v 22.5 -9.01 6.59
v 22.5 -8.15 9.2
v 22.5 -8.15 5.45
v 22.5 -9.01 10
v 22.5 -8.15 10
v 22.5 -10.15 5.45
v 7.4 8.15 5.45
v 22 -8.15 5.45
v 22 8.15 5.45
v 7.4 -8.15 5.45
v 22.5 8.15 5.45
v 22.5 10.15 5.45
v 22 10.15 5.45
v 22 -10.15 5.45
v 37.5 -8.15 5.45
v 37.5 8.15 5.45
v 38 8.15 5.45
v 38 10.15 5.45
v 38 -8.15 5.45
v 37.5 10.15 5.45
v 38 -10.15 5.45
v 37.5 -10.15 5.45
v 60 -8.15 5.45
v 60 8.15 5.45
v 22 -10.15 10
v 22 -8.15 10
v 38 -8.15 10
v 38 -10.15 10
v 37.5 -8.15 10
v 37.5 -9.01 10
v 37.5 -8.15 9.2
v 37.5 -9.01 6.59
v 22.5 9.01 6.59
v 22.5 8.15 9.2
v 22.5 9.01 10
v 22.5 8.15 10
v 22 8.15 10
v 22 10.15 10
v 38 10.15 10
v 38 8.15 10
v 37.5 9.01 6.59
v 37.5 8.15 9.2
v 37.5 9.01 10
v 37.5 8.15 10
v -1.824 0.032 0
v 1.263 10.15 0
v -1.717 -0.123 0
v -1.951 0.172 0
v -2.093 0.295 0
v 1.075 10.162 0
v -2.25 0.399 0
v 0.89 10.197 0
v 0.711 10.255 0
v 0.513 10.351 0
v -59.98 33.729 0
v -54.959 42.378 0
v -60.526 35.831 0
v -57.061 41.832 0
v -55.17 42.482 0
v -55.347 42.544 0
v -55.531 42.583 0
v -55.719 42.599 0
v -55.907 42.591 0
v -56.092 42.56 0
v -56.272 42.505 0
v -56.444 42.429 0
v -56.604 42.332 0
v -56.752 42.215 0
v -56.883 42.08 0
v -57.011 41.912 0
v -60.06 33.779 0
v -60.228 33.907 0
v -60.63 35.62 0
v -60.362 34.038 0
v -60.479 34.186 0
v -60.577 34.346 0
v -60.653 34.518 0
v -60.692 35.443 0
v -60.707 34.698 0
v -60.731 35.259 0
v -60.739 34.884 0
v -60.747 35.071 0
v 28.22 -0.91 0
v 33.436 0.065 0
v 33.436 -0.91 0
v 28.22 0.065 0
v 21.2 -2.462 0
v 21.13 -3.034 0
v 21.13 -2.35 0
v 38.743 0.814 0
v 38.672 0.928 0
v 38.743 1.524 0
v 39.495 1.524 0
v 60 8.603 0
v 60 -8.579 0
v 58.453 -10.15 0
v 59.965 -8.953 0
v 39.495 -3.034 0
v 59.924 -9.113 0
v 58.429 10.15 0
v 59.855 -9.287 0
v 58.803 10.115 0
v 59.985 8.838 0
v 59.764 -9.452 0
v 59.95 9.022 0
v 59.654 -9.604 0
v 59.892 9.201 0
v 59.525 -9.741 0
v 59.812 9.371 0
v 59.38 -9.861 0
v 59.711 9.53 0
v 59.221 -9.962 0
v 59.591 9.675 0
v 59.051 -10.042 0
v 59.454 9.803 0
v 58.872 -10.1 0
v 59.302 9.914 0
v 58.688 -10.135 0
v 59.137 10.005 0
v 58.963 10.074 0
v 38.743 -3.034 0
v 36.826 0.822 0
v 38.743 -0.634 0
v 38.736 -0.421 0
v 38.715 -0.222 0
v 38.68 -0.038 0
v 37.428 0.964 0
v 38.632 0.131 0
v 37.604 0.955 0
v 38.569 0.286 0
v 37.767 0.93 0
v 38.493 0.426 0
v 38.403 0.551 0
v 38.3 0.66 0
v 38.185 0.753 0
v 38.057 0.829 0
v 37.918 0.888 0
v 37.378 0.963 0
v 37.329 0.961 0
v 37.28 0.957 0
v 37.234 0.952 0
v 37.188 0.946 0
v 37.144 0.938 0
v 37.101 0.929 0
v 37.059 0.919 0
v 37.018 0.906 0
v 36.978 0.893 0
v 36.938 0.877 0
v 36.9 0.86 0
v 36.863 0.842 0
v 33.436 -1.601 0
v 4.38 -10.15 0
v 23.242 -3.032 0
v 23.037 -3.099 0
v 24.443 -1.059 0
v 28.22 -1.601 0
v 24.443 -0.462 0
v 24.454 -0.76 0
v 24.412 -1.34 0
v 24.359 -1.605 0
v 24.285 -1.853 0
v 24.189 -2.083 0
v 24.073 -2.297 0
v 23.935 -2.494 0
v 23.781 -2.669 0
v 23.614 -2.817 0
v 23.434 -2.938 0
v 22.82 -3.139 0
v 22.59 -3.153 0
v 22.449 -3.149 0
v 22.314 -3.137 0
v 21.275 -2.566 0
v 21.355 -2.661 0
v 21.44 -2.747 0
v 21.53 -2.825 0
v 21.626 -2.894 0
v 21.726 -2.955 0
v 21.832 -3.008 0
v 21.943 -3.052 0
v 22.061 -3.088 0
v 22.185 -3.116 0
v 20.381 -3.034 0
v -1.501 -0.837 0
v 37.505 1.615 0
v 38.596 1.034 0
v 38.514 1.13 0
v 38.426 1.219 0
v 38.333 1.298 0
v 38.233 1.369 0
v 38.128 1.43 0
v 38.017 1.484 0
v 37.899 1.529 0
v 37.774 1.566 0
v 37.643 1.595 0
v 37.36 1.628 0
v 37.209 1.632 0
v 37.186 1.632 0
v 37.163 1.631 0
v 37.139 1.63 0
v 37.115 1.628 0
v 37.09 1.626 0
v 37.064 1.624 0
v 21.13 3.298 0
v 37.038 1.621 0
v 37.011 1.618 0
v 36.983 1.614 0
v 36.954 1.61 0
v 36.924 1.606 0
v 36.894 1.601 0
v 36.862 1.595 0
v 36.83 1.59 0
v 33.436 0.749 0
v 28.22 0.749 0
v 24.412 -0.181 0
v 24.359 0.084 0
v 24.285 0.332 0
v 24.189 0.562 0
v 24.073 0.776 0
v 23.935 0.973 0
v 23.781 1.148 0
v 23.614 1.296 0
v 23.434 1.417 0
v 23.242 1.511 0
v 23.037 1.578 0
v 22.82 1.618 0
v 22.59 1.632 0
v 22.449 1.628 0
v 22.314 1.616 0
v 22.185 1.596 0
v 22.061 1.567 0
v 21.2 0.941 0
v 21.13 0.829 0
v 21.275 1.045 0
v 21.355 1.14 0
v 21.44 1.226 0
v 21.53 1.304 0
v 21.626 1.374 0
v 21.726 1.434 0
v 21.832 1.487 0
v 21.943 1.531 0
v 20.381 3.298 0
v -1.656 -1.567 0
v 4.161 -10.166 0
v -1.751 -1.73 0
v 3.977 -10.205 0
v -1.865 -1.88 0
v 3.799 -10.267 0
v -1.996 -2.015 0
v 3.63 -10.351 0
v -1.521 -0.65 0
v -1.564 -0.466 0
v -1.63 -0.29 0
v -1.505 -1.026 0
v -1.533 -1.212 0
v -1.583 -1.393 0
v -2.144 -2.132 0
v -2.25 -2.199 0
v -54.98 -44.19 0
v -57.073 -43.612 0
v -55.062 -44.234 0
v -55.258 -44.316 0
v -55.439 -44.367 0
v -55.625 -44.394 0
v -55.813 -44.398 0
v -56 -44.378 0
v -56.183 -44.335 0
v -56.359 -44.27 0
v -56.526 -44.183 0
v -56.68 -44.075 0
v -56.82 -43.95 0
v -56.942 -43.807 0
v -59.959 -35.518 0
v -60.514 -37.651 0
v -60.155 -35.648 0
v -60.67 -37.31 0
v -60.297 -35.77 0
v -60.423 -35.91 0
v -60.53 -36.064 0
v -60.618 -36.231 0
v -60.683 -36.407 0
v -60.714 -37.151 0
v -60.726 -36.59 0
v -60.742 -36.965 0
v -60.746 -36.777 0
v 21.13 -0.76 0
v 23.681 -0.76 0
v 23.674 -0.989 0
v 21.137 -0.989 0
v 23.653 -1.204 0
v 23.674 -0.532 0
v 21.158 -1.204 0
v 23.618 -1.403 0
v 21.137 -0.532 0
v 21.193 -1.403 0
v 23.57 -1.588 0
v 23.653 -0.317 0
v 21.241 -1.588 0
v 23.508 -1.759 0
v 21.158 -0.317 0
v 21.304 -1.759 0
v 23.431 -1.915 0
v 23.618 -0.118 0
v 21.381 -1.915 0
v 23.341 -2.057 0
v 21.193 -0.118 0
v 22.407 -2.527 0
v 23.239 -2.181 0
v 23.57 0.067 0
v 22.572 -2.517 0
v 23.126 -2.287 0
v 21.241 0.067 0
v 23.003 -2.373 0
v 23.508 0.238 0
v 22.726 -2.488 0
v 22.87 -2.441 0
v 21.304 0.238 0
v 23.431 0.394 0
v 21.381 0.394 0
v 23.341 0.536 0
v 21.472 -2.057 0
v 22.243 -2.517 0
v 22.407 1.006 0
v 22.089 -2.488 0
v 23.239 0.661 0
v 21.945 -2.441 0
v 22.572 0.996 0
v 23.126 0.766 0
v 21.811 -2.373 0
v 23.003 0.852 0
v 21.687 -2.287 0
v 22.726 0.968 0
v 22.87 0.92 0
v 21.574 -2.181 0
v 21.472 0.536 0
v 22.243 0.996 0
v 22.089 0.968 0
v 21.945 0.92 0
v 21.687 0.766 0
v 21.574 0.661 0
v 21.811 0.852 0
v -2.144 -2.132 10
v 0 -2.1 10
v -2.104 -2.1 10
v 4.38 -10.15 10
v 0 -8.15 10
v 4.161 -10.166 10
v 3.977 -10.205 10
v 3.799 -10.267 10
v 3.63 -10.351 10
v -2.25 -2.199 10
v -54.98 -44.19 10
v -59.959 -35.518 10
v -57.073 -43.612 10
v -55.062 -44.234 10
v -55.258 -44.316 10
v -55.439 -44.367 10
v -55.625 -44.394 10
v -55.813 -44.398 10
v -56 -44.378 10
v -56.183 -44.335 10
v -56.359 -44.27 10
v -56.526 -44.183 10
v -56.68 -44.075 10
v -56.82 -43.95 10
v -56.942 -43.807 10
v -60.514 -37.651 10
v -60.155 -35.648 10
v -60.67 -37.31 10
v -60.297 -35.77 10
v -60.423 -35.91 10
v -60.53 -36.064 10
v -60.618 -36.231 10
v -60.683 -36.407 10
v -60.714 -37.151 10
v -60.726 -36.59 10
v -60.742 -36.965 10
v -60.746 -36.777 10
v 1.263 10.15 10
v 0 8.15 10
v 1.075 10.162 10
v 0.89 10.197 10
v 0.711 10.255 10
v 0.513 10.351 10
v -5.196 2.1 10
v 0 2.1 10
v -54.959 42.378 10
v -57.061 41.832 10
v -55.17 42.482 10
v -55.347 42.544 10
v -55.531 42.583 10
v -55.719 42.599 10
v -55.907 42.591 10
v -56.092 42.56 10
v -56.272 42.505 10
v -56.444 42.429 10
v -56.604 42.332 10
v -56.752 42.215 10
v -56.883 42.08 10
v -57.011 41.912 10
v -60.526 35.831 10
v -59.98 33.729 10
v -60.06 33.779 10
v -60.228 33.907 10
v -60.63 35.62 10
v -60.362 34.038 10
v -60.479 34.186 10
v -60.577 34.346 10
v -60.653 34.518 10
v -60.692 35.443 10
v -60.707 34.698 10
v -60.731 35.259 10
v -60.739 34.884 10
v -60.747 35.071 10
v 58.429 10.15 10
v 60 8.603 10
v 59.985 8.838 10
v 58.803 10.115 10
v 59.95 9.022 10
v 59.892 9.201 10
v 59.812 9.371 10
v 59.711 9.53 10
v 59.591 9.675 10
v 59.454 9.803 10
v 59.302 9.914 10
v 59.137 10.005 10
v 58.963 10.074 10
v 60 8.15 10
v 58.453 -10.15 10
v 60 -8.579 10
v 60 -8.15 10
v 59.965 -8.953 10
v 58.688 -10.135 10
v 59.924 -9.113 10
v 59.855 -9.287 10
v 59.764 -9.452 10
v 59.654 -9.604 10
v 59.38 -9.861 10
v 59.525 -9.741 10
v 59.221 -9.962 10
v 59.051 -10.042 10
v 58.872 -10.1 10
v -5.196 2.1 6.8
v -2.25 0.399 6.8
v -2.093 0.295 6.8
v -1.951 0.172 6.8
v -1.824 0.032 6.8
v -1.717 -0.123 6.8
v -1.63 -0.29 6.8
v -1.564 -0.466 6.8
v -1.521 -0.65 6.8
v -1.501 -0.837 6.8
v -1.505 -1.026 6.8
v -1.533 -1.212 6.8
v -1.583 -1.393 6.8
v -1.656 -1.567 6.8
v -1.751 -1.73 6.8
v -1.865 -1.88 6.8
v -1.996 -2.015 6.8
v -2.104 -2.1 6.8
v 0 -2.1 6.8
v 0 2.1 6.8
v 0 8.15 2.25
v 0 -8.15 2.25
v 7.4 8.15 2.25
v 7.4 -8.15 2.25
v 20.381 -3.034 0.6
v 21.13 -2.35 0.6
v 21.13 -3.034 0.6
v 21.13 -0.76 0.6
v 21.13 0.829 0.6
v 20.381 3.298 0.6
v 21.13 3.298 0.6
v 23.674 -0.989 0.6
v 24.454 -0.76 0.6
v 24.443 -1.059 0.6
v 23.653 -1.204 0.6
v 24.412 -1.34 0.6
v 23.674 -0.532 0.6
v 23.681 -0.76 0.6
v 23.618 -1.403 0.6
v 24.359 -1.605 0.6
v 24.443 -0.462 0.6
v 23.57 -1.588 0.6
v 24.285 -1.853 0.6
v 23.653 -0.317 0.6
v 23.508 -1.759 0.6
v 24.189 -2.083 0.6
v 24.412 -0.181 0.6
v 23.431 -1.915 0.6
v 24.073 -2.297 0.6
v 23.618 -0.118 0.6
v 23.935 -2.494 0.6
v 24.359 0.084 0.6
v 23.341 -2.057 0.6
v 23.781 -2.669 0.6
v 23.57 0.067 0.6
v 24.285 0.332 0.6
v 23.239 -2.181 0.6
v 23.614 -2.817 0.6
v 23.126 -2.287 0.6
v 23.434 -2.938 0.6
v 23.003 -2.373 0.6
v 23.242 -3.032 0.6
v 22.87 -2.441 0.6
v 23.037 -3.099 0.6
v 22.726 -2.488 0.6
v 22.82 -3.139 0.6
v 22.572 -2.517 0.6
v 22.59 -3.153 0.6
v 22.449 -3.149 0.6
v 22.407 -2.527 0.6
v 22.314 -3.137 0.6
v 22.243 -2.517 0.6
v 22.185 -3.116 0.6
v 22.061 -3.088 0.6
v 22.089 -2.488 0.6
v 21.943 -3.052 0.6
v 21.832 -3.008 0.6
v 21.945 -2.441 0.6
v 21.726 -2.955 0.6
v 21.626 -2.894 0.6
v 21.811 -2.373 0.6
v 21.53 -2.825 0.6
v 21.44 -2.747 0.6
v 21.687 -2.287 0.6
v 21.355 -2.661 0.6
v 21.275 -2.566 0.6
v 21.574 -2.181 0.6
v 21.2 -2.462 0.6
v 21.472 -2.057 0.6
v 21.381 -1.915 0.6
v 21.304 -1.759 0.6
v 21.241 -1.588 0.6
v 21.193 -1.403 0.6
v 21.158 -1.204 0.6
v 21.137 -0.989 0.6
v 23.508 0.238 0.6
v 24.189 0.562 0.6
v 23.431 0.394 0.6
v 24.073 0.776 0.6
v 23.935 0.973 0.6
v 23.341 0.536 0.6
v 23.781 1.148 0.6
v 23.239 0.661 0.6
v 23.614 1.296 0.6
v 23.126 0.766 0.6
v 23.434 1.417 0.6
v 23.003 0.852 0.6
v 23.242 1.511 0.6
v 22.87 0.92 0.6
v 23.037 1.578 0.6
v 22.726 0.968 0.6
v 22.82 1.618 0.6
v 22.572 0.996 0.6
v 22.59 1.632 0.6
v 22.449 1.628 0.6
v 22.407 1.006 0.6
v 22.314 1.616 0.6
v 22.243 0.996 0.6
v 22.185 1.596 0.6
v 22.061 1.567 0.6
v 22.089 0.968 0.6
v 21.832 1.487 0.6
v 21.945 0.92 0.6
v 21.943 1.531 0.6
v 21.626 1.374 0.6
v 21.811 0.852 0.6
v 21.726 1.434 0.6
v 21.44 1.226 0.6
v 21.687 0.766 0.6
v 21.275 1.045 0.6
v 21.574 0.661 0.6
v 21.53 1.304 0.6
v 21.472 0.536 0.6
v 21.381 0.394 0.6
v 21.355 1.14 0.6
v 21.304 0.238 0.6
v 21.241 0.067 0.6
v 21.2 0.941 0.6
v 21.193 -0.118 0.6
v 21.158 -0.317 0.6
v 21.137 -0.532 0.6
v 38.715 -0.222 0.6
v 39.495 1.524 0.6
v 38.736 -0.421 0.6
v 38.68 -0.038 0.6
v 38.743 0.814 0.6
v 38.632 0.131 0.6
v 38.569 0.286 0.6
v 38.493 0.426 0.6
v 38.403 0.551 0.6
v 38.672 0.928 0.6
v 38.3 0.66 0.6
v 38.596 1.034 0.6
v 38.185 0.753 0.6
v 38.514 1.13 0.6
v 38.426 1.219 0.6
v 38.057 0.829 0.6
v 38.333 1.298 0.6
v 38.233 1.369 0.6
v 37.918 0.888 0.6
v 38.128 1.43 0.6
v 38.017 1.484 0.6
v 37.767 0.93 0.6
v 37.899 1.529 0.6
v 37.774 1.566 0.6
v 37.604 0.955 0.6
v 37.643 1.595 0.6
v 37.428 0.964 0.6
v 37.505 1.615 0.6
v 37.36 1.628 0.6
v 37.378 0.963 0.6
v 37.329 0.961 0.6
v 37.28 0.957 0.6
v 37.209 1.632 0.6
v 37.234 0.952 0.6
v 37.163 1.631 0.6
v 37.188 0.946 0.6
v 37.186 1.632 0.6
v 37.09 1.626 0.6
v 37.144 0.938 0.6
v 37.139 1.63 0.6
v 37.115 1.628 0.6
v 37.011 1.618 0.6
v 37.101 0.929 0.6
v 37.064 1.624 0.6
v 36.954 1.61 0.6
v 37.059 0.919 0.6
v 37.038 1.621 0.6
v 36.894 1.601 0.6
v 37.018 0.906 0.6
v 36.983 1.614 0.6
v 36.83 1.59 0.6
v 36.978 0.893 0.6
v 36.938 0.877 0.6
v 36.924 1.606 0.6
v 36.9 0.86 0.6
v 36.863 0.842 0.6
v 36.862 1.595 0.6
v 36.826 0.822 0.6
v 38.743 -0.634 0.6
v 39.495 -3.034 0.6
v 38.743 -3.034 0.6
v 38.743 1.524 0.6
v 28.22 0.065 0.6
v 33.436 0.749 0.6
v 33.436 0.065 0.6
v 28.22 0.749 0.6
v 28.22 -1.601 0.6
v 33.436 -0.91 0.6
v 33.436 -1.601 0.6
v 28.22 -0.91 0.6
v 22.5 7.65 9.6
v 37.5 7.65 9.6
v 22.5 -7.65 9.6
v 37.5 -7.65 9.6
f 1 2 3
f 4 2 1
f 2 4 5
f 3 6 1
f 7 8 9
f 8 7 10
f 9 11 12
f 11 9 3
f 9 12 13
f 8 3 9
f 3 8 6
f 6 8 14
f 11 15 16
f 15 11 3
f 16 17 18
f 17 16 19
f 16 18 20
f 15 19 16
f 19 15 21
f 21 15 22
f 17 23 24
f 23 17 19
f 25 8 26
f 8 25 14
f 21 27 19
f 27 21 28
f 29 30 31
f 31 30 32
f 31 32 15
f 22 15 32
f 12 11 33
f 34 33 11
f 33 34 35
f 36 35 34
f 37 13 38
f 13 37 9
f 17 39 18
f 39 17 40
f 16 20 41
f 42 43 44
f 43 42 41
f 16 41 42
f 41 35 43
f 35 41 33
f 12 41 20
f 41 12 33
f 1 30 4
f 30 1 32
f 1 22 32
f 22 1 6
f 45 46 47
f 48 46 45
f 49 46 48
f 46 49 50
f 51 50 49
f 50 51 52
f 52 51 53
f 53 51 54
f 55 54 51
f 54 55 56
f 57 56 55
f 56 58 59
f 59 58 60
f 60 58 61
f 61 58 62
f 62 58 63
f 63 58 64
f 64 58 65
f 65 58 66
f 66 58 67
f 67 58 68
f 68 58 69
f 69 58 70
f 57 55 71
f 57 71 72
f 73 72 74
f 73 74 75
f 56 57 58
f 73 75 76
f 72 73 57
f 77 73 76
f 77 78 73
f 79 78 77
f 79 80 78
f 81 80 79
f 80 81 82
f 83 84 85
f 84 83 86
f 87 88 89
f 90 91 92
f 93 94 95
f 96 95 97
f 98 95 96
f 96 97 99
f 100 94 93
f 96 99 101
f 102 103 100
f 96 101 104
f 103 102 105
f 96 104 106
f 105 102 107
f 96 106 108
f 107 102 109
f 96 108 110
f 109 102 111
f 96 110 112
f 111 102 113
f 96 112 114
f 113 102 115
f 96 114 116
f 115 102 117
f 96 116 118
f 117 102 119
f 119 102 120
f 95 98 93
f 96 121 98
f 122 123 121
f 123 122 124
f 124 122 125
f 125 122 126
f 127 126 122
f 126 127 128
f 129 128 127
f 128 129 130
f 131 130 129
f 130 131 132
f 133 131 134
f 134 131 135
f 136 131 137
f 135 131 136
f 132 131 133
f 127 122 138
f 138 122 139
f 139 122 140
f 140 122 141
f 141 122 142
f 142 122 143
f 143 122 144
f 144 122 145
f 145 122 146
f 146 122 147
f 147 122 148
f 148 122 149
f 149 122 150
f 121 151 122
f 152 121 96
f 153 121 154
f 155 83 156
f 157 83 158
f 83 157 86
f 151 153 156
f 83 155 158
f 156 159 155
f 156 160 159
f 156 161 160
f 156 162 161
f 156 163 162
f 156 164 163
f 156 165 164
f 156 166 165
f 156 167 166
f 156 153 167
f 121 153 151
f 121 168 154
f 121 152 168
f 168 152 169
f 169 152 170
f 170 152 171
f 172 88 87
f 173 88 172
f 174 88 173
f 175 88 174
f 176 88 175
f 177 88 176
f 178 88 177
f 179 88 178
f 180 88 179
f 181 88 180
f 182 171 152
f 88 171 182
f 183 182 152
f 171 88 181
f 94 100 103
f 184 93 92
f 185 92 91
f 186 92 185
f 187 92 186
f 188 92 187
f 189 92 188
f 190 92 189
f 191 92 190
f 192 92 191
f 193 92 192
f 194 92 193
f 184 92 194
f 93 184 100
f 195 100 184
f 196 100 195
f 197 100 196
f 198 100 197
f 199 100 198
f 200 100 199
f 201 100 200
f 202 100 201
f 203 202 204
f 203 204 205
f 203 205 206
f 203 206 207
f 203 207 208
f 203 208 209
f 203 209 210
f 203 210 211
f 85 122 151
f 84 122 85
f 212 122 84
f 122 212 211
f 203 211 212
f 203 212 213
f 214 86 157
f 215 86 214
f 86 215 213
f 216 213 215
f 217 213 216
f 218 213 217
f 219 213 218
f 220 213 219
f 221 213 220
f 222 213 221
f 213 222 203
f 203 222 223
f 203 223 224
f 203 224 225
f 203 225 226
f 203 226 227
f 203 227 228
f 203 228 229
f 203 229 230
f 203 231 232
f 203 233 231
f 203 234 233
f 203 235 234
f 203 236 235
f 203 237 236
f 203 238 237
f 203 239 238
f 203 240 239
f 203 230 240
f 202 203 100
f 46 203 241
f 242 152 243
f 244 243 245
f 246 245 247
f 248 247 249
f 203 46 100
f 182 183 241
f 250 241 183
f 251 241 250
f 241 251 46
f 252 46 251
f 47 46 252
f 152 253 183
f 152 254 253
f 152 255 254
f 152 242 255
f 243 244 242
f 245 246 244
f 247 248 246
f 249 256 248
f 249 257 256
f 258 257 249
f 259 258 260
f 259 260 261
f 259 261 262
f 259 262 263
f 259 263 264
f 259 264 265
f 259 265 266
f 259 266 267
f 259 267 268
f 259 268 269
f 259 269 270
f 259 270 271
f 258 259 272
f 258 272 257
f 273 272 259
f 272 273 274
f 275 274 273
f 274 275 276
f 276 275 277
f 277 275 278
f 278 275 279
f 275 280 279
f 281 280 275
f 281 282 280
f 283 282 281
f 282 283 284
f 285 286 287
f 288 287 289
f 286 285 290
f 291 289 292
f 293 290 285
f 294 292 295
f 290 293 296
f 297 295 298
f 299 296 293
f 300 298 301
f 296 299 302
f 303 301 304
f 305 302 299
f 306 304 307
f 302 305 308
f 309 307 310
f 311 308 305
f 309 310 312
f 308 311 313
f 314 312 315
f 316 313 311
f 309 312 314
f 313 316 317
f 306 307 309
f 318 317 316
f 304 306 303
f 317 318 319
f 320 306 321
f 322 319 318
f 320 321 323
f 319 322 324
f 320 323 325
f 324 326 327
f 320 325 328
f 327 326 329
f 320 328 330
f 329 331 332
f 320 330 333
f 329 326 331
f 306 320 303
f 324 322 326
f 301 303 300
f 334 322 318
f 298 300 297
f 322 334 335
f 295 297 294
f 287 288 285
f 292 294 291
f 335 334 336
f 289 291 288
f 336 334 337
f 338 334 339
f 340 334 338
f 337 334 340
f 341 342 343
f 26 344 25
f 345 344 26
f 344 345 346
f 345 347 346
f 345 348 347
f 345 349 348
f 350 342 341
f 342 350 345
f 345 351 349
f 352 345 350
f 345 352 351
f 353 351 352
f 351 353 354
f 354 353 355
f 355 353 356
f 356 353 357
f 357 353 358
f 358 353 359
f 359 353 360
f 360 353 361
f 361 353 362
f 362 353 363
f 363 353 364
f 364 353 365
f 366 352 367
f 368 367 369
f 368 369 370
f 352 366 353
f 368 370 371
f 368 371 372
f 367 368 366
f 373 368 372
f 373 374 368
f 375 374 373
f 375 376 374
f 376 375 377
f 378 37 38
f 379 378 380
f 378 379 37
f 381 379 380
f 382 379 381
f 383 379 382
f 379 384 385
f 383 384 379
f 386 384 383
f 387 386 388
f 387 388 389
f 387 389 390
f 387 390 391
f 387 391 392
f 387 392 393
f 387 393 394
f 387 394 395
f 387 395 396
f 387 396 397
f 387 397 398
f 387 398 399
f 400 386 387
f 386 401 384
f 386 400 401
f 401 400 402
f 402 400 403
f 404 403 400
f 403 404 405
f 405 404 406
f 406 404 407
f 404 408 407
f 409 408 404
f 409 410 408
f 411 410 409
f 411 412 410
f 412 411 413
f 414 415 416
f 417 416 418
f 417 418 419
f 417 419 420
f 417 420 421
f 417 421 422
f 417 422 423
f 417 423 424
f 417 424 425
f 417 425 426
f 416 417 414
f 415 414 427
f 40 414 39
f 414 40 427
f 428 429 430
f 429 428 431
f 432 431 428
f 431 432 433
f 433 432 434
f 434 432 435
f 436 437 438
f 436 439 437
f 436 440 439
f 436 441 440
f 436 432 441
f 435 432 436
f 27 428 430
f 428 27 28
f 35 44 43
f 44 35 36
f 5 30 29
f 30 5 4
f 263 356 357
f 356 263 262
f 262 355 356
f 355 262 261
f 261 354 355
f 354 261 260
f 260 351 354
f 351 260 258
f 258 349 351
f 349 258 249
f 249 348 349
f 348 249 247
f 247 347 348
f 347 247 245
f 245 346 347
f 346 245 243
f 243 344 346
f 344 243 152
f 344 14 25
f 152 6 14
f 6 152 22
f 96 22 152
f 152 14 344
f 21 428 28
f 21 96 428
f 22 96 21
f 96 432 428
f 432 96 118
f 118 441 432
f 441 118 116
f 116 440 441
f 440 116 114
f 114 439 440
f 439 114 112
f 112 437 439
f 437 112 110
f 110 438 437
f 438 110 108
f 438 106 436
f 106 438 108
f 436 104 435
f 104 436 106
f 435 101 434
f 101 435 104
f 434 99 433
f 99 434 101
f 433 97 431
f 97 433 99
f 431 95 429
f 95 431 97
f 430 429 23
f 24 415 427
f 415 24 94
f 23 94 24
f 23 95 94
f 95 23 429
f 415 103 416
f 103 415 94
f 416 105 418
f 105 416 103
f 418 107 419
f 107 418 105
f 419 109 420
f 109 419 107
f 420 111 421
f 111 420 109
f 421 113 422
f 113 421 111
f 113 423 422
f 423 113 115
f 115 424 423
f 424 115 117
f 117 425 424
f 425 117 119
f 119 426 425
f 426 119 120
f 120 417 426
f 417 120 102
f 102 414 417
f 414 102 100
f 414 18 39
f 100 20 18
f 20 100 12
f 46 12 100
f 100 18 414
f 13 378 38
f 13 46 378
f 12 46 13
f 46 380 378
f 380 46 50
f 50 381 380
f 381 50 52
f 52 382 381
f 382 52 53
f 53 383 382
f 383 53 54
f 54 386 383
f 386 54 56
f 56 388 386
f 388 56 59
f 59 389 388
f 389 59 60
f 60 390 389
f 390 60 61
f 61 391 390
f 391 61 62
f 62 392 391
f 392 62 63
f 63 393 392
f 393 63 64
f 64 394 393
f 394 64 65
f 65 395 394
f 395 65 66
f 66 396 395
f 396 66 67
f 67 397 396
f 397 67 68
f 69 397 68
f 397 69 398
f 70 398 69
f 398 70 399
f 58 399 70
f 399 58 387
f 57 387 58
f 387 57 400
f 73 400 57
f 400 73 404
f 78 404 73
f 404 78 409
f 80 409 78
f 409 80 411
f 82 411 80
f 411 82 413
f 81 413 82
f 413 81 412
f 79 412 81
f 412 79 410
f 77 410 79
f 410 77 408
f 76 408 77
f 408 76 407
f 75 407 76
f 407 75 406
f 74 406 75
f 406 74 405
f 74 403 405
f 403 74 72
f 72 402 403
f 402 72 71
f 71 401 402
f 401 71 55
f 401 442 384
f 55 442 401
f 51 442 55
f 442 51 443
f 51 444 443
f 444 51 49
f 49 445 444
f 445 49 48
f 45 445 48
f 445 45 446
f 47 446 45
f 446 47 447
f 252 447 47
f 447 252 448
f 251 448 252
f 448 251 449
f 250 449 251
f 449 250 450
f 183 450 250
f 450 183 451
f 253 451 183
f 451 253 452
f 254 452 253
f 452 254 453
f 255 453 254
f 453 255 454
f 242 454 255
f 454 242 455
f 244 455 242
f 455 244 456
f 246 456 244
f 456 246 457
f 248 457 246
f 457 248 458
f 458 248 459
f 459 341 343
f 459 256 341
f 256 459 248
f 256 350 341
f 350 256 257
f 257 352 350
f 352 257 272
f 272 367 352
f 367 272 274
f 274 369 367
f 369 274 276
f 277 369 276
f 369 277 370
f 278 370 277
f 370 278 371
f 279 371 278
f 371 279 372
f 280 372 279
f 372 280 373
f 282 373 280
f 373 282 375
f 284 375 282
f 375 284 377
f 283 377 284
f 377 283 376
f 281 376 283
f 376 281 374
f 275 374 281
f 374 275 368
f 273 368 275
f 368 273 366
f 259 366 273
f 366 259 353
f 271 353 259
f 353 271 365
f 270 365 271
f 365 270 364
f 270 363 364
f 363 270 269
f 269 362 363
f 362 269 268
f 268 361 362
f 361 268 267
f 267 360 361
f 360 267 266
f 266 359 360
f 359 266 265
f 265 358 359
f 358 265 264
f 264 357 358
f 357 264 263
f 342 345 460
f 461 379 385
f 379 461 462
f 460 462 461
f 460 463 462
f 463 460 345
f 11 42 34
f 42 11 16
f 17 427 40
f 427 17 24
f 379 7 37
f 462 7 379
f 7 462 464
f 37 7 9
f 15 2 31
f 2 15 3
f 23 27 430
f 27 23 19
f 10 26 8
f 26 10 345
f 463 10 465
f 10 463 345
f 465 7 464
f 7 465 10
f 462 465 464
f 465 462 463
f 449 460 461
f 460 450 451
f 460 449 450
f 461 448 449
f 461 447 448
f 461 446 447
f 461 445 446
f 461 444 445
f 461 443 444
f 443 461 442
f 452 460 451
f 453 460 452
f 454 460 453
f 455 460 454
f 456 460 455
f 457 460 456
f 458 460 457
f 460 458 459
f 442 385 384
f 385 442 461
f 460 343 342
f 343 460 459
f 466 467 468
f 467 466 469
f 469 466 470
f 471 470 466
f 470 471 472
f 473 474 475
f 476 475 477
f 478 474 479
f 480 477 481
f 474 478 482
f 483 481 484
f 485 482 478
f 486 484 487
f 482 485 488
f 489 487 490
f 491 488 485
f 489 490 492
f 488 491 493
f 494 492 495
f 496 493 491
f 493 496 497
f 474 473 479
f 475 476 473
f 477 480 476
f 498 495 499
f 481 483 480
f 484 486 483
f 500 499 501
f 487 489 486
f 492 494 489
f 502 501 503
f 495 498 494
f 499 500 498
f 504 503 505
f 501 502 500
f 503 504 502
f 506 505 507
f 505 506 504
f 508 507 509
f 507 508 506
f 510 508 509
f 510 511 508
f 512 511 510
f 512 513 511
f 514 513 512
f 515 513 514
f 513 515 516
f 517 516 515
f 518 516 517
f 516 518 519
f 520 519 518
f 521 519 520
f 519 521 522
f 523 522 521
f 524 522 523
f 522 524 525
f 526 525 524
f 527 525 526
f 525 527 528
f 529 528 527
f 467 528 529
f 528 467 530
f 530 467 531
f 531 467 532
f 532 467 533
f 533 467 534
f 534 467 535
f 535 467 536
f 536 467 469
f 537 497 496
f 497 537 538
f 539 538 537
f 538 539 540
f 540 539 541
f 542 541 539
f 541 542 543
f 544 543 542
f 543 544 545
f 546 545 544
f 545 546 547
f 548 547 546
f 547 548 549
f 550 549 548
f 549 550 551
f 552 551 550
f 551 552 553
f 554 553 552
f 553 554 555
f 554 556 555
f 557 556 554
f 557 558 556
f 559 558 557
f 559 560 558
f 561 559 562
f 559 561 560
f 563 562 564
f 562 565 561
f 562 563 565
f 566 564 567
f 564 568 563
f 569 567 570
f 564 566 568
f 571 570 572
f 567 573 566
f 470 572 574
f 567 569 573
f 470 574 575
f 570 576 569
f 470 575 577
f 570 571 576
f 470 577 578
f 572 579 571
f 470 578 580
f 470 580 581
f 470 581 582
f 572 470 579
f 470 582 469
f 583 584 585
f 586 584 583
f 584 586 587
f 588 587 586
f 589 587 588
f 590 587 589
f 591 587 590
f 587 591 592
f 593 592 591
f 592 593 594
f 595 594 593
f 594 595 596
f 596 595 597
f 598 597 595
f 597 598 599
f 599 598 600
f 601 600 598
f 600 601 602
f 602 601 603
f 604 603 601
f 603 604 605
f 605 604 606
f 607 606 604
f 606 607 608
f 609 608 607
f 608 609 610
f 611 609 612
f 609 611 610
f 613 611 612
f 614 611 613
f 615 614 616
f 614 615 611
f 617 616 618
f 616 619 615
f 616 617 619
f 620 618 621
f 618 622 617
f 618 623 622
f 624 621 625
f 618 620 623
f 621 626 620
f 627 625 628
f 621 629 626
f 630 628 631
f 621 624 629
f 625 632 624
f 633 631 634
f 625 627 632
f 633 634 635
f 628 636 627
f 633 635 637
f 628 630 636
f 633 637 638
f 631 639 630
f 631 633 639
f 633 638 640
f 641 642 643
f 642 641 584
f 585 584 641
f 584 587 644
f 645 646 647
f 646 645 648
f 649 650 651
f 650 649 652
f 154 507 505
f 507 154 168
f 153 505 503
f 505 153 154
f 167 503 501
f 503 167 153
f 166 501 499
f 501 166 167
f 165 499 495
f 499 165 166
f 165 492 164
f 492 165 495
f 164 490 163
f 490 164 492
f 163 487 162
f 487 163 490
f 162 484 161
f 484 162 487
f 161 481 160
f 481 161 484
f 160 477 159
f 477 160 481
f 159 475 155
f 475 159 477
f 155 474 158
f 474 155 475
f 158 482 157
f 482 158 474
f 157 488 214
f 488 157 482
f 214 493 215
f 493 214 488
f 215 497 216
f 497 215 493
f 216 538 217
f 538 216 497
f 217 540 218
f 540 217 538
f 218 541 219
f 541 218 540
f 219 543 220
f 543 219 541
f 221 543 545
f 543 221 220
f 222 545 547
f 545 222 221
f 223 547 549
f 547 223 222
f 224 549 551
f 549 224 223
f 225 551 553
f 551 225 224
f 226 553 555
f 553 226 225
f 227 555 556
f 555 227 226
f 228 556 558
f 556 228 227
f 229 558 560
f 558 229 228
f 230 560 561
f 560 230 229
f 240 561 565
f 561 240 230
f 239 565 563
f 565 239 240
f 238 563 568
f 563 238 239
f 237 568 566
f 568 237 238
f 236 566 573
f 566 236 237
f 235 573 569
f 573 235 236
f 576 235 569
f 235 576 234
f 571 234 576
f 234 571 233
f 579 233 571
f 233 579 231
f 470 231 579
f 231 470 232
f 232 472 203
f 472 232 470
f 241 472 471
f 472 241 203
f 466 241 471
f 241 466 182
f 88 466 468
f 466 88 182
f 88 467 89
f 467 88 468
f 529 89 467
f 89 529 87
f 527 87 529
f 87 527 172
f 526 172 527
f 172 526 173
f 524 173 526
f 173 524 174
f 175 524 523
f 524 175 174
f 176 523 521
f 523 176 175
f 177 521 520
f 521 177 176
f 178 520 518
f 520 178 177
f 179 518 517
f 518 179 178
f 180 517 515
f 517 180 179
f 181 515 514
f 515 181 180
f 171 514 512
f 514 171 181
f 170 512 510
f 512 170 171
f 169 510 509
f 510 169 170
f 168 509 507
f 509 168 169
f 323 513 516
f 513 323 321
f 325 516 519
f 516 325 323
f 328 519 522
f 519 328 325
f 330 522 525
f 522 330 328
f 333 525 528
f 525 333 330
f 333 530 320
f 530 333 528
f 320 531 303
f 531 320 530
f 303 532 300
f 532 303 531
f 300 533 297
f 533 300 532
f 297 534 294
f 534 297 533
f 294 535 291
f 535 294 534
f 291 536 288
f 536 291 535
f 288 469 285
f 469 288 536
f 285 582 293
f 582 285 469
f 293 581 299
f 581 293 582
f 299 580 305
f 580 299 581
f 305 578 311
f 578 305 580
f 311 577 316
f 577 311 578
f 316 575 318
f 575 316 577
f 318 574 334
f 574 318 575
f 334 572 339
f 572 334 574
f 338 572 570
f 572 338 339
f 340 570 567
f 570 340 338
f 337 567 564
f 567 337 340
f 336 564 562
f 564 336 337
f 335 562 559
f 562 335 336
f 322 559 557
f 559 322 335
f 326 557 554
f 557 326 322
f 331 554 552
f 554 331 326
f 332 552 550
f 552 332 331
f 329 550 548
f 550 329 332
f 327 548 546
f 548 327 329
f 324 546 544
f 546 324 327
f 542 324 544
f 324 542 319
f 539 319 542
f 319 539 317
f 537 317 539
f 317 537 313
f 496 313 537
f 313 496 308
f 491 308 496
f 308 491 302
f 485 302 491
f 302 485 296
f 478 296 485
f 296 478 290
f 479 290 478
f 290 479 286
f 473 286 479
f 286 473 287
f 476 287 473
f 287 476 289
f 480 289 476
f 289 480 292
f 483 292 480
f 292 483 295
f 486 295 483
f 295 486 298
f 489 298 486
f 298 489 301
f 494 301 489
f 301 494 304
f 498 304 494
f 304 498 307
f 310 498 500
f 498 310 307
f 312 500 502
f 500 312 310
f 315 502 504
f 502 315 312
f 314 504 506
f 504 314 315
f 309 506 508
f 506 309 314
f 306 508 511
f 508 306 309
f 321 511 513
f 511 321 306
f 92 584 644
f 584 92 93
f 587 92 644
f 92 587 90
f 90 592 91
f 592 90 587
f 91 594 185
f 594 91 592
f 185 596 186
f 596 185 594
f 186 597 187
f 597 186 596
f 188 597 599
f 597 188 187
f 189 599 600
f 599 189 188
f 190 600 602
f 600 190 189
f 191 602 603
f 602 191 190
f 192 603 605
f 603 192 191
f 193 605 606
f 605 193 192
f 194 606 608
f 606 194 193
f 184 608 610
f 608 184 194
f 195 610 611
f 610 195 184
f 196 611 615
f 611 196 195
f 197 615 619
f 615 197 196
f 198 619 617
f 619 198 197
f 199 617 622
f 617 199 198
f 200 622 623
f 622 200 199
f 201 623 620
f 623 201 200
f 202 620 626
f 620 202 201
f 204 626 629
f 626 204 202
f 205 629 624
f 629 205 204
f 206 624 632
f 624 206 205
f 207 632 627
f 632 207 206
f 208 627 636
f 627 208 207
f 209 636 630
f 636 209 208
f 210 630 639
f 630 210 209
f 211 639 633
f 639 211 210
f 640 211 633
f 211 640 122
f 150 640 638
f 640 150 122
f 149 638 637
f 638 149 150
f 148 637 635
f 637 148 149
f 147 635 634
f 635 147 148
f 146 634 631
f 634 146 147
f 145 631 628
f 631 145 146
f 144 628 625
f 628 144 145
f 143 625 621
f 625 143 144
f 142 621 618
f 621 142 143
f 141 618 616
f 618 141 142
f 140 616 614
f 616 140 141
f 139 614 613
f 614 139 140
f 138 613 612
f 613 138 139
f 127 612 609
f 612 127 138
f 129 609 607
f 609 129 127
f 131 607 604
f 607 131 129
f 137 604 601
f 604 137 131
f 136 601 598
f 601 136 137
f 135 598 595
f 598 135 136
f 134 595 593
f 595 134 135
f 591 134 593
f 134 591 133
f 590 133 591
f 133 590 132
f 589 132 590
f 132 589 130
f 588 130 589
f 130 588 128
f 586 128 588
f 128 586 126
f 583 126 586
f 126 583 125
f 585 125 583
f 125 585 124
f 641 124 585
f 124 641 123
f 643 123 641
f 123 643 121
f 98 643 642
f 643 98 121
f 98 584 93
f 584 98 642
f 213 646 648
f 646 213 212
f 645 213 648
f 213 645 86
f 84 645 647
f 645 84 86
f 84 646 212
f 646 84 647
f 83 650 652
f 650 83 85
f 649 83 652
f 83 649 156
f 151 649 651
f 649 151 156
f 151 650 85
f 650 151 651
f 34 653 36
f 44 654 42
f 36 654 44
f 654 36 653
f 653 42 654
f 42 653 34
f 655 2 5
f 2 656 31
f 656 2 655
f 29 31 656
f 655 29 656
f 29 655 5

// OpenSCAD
// radius gauge attachment for calipers inspired by https://www.prusaprinters.org/prints/14474-radius-gauge-for-calipers

// note: my calipers are very cheap, change the fitment settings to suit your own (appears mostly universal so feel free to try this first)

// radius of measured object = 
//    caliper measurement * sin(interior_angle) / (1-sin(interior_angle))



/* [Important] */

// the angle in the interior arms that determines the equation used to get the final measurement (see the bottomside label). Smaller values give longer arms but more precision and easier measurements.
interior_angle=30; //[11.5370, 19.4712, 30, 41.8103, 45, 48.5904]
// respectively: D=d/2, D=d, r=d, r=2*d, r=(sqrt(2)+q)*d  using a smaller number will increase the arm length considerably, but increase simplicity/speed of use and measurement precision. You can set this to any angle and the measurement multiplier will be displayed in the console output.

// maximum measurable radius (specifies arm length, calculated arm length shown in console output)
maximum_radius=40;



/* [Strength and Rigidity] */

// the length up the caliper the gauge will sit, make sure it is long enough to stay sturdy
caliper_support_length=60;
// total thickness of the model
total_thickness=10; //[0:0.1:20]
// side wall thickness of the section surrounding the caliper
caliper_side_wall=2; //[0:0.1:10]
// width of the arms
arm_width=10; //[0:0.1:40]
// extends the wall in the V of the arms to help with flex
minimum_radius=0; //[0:0.1:30]



/* [Fitment] */

// largest width of the caliper arm
caliper_width=16; //[0:0.1:30]
// largest thickness of the caliper arm
caliper_thickness=3.6; //[0:0.1:10]
// width of the caliper sliding arm
caliper_slide_width=3.8; //[0:0.1:10]
// thickness of the caliper sliding arm
caliper_slide_thickness=2; //[0:0.1:10]
// width of the end tip of the caliper sliding arm
caliper_slide_tip_width=2; //[0:0.1:10]
// width of the plate holding the caliper together
caliper_plate_width=7; //[0:0.1:20]
// depth of the plate holding the caliper together
caliper_plate_depth=2; //[0:0.1:10]



/* [Clips for Caliper] */
// enable if you would like to clip the caliper into the gauge, rather than sit it in place
clips=true;
// Z height of the caliper clips. Adjust such that the overhang angle is printable (check console output)
clip_height=0.8;
// Y width of the caliper clips
clip_width=0.5;
// length of the clip
clip_length=15;
// provide a gap either side of the clip to enable it to flex
clip_seperation_gap=0.5;
// wall thickness of the clips
clip_thickness=0.86;



/* [Hole for Magnet] */
// enable if you would like to add an interior hole for a magnet
magnet=false;
number_of_magnets=2;
magnet_shape="cube"; //["cube", "cylinder"]
// applies to both cylinder and cube. Ensure total_thickness is enough to encompass magnet
magnet_thickness=2; //[0:0.1:10]
// applies if cylinder
magnet_diameter=14; //[0:0.1:50]
// applies if cube
magnet_width=10; //[0:0.1:50]
// applies if cube
magnet_length=20; //[0:0.1:50]
// applies if number of magnets > 1
magnet_spacing=2; //[0:0.1:20]
// turn off before rendering
preview_magnet=false;




/* [Embedded Label for Measurement Equation] */
enable_label=true;
font_style="osifont";
font_size=6; //[0:0.1:30]
font_depth=0.6; //[0:0.1:3]
decimal_places=3; //[5]


/* [Aesthetic] */

// add fillets to the corners of the model
XY_fillet_radius=1.5; //[0:0.1:10]



/* [Resolution] */
$fn=50; //[200]
tolerance=0.15; //[0:0.01:1]
clearance=0.4; //[0:0.1:2]



/* [Hidden] */

// Derived values

// width of the model around the caliper section
total_width_caliper=caliper_width+2*tolerance+2*caliper_side_wall;

// offset the caliper slightly such that the tip of the slide is centered in the arms
caliper_slide_exit_offset=caliper_slide_tip_width/2 - caliper_slide_width/2;
echo(caliper_slide_exit_offset=caliper_slide_exit_offset);

// check the lengths of the arms
arm_length=maximum_radius/tan(interior_angle);
echo(arm_length=arm_length);

// check the overhang of the clips (shouldn't be a big deal on most printers)
clip_overhang_angle=90-atan(clip_height/2/clip_width);
echo(clip_overhang_angle=clip_overhang_angle);

// amount to move magnet across
magnet_x=magnet_spacing + (magnet_shape=="cylinder" ? magnet_diameter : magnet_length);

// amount to multiply the measured value by to get the radius
measurement_multiplier=((interior_angle<30) ? 2 : 1)*sin(interior_angle) / (1-sin(interior_angle));
echo(measurement_multiplier=measurement_multiplier);
label_string=str((interior_angle<30) ? "D = " : "r = ", abs(measurement_multiplier-1) < 0.001 ? "" : round(measurement_multiplier*10^decimal_places)/10^decimal_places, "d");



// draw object
if (preview_magnet==false)
{
    radius_gauge();
}
else
{
    %radius_gauge();
    magnet();
}

// MAIN
module radius_gauge()
{
    difference()
    {
        
        //main body
        linear_extrude(total_thickness, convexity=2)
        offset(r = -XY_fillet_radius)
        offset(r = 2*XY_fillet_radius)
        offset(r = -XY_fillet_radius)
        union()
        {
            translate([0, -total_width_caliper/2])
            square([caliper_support_length, total_width_caliper]);
            
            //arms
            rotate([0,0,180])
            translate([0,-caliper_slide_exit_offset])
            mirror_offset(v=[0,1,0], duplicate=true)
            rotate([0,0,interior_angle])
            square([arm_length+XY_fillet_radius, arm_width]);
            
            intersection()
            {
                rotate([0,0,180])
                translate([0,-caliper_slide_exit_offset])
                mirror_offset(v=[0,1,0], duplicate=true)
                rotate([0,0,interior_angle])
                translate([-arm_length,0,0])
                square([arm_length, arm_width]);
                
                translate([0, -total_width_caliper/2])
                square([caliper_support_length, total_width_caliper]);
            }
            
        }
        
        //main caliper slot
        translate([0, -(caliper_width+2*tolerance)/2, total_thickness-(caliper_thickness+clip_height+tolerance)])
        cube([caliper_support_length+1, caliper_width+2*tolerance, caliper_thickness+clip_height+1]);
        
        //caliper plate clearance divet
        translate([0, -(caliper_width+2*tolerance)/2, total_thickness-(caliper_thickness+clip_height+tolerance)-(caliper_plate_depth+clip_height+clearance)])
        cube([caliper_plate_width+clearance, caliper_width+2*tolerance, caliper_plate_depth+clip_height+1]);
        
        //caliper slide clearance divet
        translate([-10, -(caliper_slide_width+clearance)/2, total_thickness-(caliper_slide_thickness+clip_height+clearance)])
        cube([11, caliper_slide_width+clearance, caliper_slide_thickness+clip_height+1]);
        
        //equation label
        if (enable_label==true)
        {
            translate([caliper_support_length/2,0,-1])
            linear_extrude(font_depth+1,convexity=2)
            rotate([180,0,180])
            text(label_string, font=font_style, size=font_size, halign="center", valign="center");
        }
        
        // clip mechanisms
        if (clips==true)
        {
            // clip seperation gaps
            mirror_offset(v=[0,1,0], duplicate=true)
            mirror_offset(v=[1,0,0], p=[caliper_support_length/2,0,0], duplicate=true)
            translate([caliper_support_length/2+clip_length/2, -total_width_caliper/2-1,total_thickness-(caliper_thickness+clip_height+tolerance)])
            cube([clip_seperation_gap, caliper_side_wall+2, caliper_thickness+clip_height+1]);
            
            // thin clip walls
            mirror_offset(v=[0,1,0], duplicate=true)
            translate([caliper_support_length/2, total_width_caliper/2, total_thickness-(caliper_thickness+clip_height+tolerance)+total_thickness/2])
            difference()
            {
                cube([clip_length+clip_seperation_gap, 2*(caliper_side_wall-clip_thickness), total_thickness], center=true);
                
                translate([-(clip_length+clip_seperation_gap+2)/2,0, -total_thickness/2])
                rotate([45,0,0])
                mirror([0,1,0])
                cube([clip_length+clip_seperation_gap+2,10,10]);
            }
        }
        
        //magnet hole
        if (magnet==true)
        {
            magnet();
            echo(magnet_depth=(total_thickness-(caliper_thickness+clip_height))/2-(magnet_thickness+tolerance)/2);
            echo(PAUSE_AT_Z_HEIGHT=(total_thickness-(caliper_thickness+clip_height))/2+(magnet_thickness+tolerance)/2);
        }
    }

    //thicken extra wall determined by minimum_radius
    translate([-minimum_radius, -caliper_width/2+caliper_slide_exit_offset, 0])
    cube([minimum_radius,caliper_width,total_thickness-(caliper_slide_thickness+clip_height+clearance)]);

    //slot mechanism clips
    if (clips == true)
    {
        mirror_offset(v=[0,1,0], duplicate=true)
        translate([caliper_support_length/2,-(caliper_width+2*tolerance)/2,total_thickness-clip_height/2])
        rotate([0,90,0])
        linear_extrude(clip_length, center=true)
        polygon([ [0,0], [clip_height/2,0], [0,clip_width], [-clip_height/2,0] ]);
    }
}

module magnet()
{
    translate([caliper_support_length/2-(number_of_magnets-1)*magnet_x/2, 0, (total_thickness-(caliper_thickness+clip_height))/2])
    for (i=[1:number_of_magnets])
    {
        translate([(i-1)*magnet_x,0,0])
        if (magnet_shape=="cylinder")
        {
            cylinder(h=magnet_thickness+tolerance, d=magnet_diameter+tolerance, center=true);
        }
        else
        {
            cube([magnet_length, magnet_width, magnet_thickness]+tolerance*[1,1,1], center=true);
        }
    }
}


module mirror_offset(v, p=[0,0,0], duplicate=false)
{
    
    mirror(v)
    translate(-2*p)
    children();
    
    if(duplicate){ children(); }
    
}
